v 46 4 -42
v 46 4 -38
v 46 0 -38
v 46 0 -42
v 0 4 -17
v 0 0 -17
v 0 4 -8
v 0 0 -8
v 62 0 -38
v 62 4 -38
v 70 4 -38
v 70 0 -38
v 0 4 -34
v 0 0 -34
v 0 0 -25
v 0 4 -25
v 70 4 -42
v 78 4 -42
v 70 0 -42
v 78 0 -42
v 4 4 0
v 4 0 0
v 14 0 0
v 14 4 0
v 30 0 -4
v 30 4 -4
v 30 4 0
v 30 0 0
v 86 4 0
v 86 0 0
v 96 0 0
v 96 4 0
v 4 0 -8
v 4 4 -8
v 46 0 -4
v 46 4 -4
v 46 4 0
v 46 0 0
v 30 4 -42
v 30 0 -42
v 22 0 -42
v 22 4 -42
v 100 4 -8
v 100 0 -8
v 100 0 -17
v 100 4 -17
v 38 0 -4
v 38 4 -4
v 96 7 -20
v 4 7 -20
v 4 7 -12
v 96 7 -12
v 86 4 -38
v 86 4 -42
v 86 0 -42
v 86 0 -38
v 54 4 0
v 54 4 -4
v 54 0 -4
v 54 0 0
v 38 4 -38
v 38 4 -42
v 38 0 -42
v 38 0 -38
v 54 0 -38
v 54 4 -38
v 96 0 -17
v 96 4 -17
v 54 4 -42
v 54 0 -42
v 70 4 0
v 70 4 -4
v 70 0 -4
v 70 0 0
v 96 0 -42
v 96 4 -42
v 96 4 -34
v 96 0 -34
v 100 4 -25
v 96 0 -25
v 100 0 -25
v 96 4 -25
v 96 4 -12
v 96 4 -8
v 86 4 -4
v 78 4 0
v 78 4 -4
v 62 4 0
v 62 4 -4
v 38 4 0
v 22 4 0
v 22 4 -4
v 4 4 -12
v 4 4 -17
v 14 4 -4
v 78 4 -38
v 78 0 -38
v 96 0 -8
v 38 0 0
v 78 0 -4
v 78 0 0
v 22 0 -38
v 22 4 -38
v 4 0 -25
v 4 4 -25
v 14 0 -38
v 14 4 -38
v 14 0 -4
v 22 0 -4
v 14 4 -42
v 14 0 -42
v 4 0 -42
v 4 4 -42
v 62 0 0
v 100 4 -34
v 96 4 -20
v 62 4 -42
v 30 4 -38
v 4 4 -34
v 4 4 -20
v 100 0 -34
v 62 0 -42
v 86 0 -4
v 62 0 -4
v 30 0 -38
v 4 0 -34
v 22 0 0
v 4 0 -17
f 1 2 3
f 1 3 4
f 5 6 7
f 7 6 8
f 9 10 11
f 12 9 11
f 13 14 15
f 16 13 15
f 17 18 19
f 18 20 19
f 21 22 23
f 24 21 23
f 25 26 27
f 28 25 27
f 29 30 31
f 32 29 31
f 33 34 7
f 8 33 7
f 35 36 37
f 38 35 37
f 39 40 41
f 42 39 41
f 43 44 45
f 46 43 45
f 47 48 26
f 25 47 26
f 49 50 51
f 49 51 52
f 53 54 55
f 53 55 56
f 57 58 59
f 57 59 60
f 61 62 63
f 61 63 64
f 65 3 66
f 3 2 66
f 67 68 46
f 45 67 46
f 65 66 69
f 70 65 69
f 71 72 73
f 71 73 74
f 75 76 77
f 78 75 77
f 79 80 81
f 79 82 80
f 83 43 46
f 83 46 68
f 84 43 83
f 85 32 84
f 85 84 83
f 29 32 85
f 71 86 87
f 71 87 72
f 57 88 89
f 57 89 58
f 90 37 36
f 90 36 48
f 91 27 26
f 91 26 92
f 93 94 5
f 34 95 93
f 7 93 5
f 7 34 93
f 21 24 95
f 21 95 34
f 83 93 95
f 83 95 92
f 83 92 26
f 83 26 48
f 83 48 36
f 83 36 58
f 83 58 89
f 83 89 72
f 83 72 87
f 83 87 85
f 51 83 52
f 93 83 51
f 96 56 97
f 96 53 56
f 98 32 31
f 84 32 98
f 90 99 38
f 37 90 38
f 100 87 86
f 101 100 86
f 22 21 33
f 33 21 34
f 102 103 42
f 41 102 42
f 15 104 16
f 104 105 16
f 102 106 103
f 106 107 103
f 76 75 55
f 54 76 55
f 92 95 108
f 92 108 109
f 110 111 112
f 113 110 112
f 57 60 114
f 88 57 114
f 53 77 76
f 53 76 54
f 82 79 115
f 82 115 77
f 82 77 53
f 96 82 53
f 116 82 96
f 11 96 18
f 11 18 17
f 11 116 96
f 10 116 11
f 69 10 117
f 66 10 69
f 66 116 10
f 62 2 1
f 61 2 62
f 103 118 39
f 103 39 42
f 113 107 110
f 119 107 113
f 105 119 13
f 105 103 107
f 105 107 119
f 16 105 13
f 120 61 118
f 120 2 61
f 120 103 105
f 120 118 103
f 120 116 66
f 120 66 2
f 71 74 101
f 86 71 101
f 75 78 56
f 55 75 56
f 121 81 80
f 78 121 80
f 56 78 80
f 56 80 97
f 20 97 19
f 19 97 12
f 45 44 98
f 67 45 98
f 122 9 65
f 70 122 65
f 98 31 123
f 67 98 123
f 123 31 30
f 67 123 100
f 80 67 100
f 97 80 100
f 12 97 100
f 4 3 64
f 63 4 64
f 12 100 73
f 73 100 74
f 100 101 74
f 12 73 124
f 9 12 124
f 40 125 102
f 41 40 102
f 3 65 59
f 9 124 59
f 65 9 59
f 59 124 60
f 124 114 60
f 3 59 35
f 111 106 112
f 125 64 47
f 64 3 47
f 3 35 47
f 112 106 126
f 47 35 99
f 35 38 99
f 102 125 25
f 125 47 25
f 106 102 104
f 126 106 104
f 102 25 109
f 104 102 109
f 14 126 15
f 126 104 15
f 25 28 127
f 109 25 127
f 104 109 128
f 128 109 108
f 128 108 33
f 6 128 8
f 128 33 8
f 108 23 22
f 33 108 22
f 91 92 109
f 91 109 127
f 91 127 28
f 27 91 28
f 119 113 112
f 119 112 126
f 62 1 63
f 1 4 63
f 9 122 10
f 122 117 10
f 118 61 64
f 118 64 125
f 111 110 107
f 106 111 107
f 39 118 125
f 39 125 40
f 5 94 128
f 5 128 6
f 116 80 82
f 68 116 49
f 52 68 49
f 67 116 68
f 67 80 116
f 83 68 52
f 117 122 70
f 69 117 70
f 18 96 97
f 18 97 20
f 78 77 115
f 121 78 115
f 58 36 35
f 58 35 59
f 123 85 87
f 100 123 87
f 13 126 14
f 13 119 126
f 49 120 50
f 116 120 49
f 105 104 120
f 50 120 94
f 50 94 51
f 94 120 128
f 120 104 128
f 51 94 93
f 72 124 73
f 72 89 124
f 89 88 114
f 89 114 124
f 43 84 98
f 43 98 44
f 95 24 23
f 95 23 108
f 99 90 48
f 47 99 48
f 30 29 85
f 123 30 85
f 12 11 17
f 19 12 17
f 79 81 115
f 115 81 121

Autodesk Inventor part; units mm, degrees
ref_plane "YZ Plane" through (0, 0, 0) normal (1, 0, 0) x (0, 1, 0)
ref_plane "XZ Plane" through (0, 0, 0) normal (0, 1, 0) x (-1, 0, 0)
ref_plane "XY Plane" through (0, 0, 0) normal (0, 0, 1) x (1, 0, 0)
sketch "Sketch1" plane through (0, 0, 0) normal (0, 1, 0) x (-1, 0, 0)
  line L0 (0, 0) -> (-100, 0)
  line L1 (-100, 0) -> (-100, -42)
  line L2 (-100, -42) -> (0, -42)
  line L3 (0, -42) -> (0, 0)
  dimension "d0" = 100
  dimension "d1" = 42
extrude "Extrusion1" add sketch "Sketch1" along normal blind 4
sketch "Sketch2" plane through (0, 4, 0) normal (0, 1, 0) x (1, 0, 0)
  line L0 (0, 0) -> (100, 0) construction
  line L1 (100, 0) -> (100, 42) construction
  line L2 (100, 42) -> (0, 42) construction
  line L3 (0, 42) -> (0, 0) construction
  line L4 (4, 38) -> (96, 38) construction
  line L5 (96, 38) -> (96, 4) construction
  line L6 (96, 4) -> (4, 4) construction
  line L7 (4, 4) -> (4, 38) construction
  line L8 (100, 42) -> (0, 42) projected
  line L9 (4, 42) -> (4, 34)
  line L10 (4, 34) -> (0, 34)
  line L11 (0, 42) -> (0, 0) projected
  line L12 (0, 34) -> (0, 42)
  line L13 (0, 42) -> (4, 42)
  line L14 (0, 21) -> (100, 21) construction
  line L15 (50, 42) -> (50, 0) construction
  line L16 (0, 0) -> (100, 0) construction
  line L17 (0, 21) -> (0, 25)
  line L18 (4, 25) -> (0, 25)
  line L19 (4, 25) -> (4, 21)
  line L20 (14, 42) -> (14, 38)
  line L21 (14, 38) -> (22, 38)
  line L22 (22, 38) -> (22, 42)
  line L23 (14, 42) -> (22, 42)
  line L24 (30, 42) -> (38, 42)
  line L25 (38, 42) -> (38, 38)
  line L26 (38, 38) -> (30, 38)
  line L27 (30, 38) -> (30, 42)
  line L28 (50, 38) -> (46, 38)
  line L29 (46, 38) -> (46, 42)
  line L30 (46, 42) -> (50, 42)
  line L31 (4, 0) -> (4, 8)
  line L32 (4, 8) -> (0, 8)
  line L33 (0, 8) -> (0, 0)
  line L34 (0, 0) -> (4, 0)
  line L35 (0, 21) -> (0, 17)
  line L36 (4, 17) -> (0, 17)
  line L37 (4, 17) -> (4, 21)
  line L38 (14, 0) -> (14, 4)
  line L39 (14, 4) -> (22, 4)
  line L40 (22, 4) -> (22, 0)
  line L41 (14, 0) -> (22, 0)
  line L42 (30, 0) -> (38, 0)
  line L43 (38, 0) -> (38, 4)
  line L44 (38, 4) -> (30, 4)
  line L45 (30, 4) -> (30, 0)
  line L46 (50, 4) -> (46, 4)
  line L47 (46, 4) -> (46, 0)
  line L48 (46, 0) -> (50, 0)
  line L49 (100, 42) -> (100, 0) construction
  line L50 (96, 4) -> (96, 38) construction
  line L51 (96, 42) -> (96, 34)
  line L52 (96, 34) -> (100, 34)
  line L53 (100, 42) -> (100, 0)
  line L54 (100, 34) -> (100, 42)
  line L55 (100, 42) -> (96, 42)
  line L56 (100, 21) -> (100, 25)
  line L57 (96, 25) -> (100, 25)
  line L58 (96, 25) -> (96, 21)
  line L59 (86, 42) -> (86, 38)
  line L60 (86, 38) -> (78, 38)
  line L61 (78, 38) -> (78, 42)
  line L62 (86, 42) -> (78, 42)
  line L63 (70, 42) -> (62, 42)
  line L64 (62, 42) -> (62, 38)
  line L65 (62, 38) -> (70, 38)
  line L66 (70, 38) -> (70, 42)
  line L67 (50, 38) -> (54, 38)
  line L68 (54, 38) -> (54, 42)
  line L69 (54, 42) -> (50, 42)
  line L70 (70, 4) -> (70, 0)
  line L71 (62, 4) -> (70, 4)
  line L72 (70, 0) -> (62, 0)
  line L73 (62, 0) -> (62, 4)
  line L74 (54, 4) -> (54, 0)
  line L75 (50, 4) -> (54, 4)
  line L76 (54, 0) -> (50, 0)
  line L77 (78, 4) -> (78, 0)
  line L78 (86, 4) -> (78, 4)
  line L79 (86, 0) -> (78, 0)
  line L80 (86, 0) -> (86, 4)
  line L81 (96, 0) -> (96, 8)
  line L82 (100, 0) -> (96, 0)
  line L83 (96, 8) -> (100, 8)
  line L84 (100, 8) -> (100, 0)
  line L85 (96, 17) -> (96, 21)
  line L86 (100, 21) -> (100, 17)
  line L87 (96, 17) -> (100, 17)
  dimension "d4" = 4
  dimension "d5" = 4
  dimension "d7" = 8
  dimension "d8" = 8
  dimension "d10" = 8
  dimension "d11" = 8
  dimension "d13" = 4
  dimension "d14" = 8
extrude "Extrusion2" cut sketch "Sketch2" against normal up to surface (4 mm away)
sketch "Sketch3" plane through (0, 4, 0) normal (0, 1, 0) x (1, 0, 0)
  line L0 (4, 25) -> (4, 17) projected
  line L1 (96, 0) -> (96, 8) projected
  line L2 (4, 20) -> (96, 20)
  line L3 (96, 20) -> (96, 12)
  line L4 (96, 12) -> (4, 12)
  line L5 (4, 12) -> (4, 20)
  line L6 (30, 4) -> (38, 4) projected
  point P0 (0, 0)
  dimension "d17" = 8
  dimension "d18" = 8
extrude "Extrusion3" add sketch "Sketch3" along normal blind 3
properties part number "front" material "PBT Plastic Black"
